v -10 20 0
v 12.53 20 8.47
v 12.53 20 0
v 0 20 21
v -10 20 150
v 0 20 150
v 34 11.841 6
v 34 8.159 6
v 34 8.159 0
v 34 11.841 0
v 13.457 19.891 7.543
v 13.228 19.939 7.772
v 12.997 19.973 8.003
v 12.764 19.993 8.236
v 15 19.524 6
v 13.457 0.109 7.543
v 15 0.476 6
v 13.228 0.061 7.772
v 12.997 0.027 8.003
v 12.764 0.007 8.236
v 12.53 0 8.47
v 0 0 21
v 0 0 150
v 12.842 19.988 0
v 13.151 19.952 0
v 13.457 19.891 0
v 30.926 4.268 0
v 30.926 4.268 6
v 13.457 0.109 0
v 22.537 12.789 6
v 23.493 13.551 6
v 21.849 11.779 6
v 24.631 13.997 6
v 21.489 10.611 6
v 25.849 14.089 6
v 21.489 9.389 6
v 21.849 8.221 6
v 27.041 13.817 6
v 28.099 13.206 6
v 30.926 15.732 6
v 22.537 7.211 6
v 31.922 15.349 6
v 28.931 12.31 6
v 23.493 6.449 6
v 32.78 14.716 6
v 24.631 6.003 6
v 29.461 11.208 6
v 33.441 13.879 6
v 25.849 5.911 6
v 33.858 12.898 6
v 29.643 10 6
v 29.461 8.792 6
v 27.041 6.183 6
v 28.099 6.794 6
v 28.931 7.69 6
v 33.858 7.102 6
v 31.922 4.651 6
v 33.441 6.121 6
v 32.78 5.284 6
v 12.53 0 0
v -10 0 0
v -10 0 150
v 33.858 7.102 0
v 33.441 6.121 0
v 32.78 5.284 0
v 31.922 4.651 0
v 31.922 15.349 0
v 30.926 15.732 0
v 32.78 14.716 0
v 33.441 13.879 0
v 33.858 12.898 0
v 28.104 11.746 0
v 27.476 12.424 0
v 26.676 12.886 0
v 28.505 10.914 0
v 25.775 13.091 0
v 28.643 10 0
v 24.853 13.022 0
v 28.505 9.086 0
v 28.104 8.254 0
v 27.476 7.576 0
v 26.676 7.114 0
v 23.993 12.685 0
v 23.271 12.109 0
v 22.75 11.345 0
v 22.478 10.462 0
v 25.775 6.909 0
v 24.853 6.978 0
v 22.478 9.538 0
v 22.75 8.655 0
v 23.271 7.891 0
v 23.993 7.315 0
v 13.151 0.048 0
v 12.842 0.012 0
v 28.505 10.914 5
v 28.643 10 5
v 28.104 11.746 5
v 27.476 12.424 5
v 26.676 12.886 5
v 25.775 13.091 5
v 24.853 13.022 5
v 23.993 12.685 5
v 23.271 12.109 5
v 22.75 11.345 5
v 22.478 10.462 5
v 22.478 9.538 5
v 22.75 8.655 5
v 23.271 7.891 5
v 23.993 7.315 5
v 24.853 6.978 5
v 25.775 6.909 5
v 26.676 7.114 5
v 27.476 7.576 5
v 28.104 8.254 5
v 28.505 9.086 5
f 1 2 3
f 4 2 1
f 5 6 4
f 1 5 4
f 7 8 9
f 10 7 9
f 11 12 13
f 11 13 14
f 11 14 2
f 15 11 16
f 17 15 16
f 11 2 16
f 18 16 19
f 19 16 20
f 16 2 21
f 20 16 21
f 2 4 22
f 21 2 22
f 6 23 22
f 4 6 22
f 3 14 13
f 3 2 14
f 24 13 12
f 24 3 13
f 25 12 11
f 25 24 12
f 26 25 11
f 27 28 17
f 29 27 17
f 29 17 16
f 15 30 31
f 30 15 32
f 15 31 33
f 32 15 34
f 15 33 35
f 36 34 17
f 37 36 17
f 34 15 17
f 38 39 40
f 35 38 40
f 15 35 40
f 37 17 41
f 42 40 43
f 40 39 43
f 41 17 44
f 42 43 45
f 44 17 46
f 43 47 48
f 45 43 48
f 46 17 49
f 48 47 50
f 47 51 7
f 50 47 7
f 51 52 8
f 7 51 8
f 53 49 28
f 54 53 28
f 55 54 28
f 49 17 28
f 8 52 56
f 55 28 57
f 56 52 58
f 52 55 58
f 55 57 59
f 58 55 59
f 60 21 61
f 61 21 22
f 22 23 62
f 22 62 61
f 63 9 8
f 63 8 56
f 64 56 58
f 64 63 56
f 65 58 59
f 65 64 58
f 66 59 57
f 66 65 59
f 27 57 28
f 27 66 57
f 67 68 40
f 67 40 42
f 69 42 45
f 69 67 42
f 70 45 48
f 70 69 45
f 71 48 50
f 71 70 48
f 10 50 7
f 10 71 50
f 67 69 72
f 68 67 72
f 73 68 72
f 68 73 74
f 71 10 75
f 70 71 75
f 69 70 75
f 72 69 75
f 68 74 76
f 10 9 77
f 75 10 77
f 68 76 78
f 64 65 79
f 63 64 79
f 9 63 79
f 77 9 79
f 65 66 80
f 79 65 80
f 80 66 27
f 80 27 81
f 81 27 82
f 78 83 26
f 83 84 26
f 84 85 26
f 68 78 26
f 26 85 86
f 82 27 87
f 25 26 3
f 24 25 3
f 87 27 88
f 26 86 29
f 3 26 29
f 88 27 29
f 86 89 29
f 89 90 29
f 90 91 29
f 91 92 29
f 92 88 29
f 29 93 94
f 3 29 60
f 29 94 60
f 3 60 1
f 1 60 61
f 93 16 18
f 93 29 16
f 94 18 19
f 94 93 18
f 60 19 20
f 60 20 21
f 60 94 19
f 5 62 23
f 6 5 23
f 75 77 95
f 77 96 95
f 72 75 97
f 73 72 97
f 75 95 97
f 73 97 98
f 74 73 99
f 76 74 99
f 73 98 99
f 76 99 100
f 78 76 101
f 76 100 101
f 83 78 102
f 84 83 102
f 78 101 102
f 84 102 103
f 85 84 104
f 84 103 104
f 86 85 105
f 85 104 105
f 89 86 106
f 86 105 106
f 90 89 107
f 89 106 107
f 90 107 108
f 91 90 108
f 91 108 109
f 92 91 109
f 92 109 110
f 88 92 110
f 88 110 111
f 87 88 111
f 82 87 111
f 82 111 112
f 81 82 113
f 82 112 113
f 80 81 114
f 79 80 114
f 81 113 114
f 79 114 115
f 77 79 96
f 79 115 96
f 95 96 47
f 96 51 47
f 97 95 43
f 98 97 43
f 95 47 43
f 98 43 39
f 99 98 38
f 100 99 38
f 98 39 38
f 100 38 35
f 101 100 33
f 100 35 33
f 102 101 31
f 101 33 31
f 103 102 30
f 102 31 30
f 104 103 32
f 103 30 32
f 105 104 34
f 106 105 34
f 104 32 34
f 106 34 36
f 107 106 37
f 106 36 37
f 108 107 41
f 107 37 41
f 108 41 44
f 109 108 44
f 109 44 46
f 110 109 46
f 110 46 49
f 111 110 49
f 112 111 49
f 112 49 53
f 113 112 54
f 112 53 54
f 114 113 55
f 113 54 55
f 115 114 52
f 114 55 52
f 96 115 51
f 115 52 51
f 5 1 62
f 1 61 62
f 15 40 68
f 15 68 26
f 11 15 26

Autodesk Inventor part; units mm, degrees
ref_plane "YZ Plane" through (0, 0, 0) normal (1, 0, 0) x (0, 1, 0)
ref_plane "XZ Plane" through (0, 0, 0) normal (0, 1, 0) x (-1, 0, 0)
ref_plane "XY Plane" through (0, 0, 0) normal (0, 0, 1) x (1, 0, 0)
sketch "Sketch1" plane through (0, 0, 0) normal (0, 1, 0) x (-1, 0, 0)
  line L0 (0, 0) -> (10, 0)
  line L1 (10, 0) -> (10, 150)
  line L2 (10, 150) -> (0, 150)
  line L3 (0, 150) -> (0, 0)
  line L4 (0, 6) -> (-34, 6)
  line L5 (-34, 6) -> (-34, 0)
  line L6 (-34, 0) -> (0, 0)
  line L7 (0, 0) -> (0, 6)
  dimension "d0" = 10
  dimension "d1" = 150
  dimension "d2" = 34
  dimension "d3" = 6
extrude "Extrusion1" add sketch "Sketch1" along normal blind 20
sketch "Sketch2" plane through (0, 0, 6) normal (0, 0, 1) x (1, 0, 0)
  circle A0 centre (25.543, 10) radius 3.1
  line L0 (34, 0) -> (34, 20) projected
  point P0 (0, 0)
  point P1 (34, 10)
  dimension "d6" = 6.2
  dimension "d9" = 8.457
extrude "Extrusion2" cut sketch "Sketch2" against normal through all
chamfer "Chamfer2" distance 1 angle 45 1 edges at (22.443, 10, 6)
sketch "Sketch3" plane through (0, 0, 6) normal (0, 0, 1) x (1, 0, 0)
  line L0 (34, 0) -> (34, 20) projected
  line L1 (34, 5) -> (13, 0)
  line L2 (34, 0) -> (-10, 0) projected
  line L3 (34, 15) -> (13, 20)
  line L4 (0, 20) -> (34, 20) projected
  line L5 (34, 0) -> (34, 20) projected
  circle A0 centre (25.543, 10) radius 3.1 projected
  point P0 (0, 0)
  point P1 (34, 15)
  dimension "d16" = 10
  dimension "d17" = 5
  dimension "d18" = 21
extrude "Extrusion3" cut sketch "Sketch3" against normal through all contours L2 L1 L0 | L3 L4 L0
fillet "Fillet1" radius 4 4 edges at (34, 5, 3) (34, 15, 3) (13, 20, 3) (13, 0, 3)
chamfer "Chamfer3" distance 15 angle 45 1 edges at (0, 10, 6)
equation "\"d17\" = 0.5 * d16"
properties part number "rotator_squarer"
